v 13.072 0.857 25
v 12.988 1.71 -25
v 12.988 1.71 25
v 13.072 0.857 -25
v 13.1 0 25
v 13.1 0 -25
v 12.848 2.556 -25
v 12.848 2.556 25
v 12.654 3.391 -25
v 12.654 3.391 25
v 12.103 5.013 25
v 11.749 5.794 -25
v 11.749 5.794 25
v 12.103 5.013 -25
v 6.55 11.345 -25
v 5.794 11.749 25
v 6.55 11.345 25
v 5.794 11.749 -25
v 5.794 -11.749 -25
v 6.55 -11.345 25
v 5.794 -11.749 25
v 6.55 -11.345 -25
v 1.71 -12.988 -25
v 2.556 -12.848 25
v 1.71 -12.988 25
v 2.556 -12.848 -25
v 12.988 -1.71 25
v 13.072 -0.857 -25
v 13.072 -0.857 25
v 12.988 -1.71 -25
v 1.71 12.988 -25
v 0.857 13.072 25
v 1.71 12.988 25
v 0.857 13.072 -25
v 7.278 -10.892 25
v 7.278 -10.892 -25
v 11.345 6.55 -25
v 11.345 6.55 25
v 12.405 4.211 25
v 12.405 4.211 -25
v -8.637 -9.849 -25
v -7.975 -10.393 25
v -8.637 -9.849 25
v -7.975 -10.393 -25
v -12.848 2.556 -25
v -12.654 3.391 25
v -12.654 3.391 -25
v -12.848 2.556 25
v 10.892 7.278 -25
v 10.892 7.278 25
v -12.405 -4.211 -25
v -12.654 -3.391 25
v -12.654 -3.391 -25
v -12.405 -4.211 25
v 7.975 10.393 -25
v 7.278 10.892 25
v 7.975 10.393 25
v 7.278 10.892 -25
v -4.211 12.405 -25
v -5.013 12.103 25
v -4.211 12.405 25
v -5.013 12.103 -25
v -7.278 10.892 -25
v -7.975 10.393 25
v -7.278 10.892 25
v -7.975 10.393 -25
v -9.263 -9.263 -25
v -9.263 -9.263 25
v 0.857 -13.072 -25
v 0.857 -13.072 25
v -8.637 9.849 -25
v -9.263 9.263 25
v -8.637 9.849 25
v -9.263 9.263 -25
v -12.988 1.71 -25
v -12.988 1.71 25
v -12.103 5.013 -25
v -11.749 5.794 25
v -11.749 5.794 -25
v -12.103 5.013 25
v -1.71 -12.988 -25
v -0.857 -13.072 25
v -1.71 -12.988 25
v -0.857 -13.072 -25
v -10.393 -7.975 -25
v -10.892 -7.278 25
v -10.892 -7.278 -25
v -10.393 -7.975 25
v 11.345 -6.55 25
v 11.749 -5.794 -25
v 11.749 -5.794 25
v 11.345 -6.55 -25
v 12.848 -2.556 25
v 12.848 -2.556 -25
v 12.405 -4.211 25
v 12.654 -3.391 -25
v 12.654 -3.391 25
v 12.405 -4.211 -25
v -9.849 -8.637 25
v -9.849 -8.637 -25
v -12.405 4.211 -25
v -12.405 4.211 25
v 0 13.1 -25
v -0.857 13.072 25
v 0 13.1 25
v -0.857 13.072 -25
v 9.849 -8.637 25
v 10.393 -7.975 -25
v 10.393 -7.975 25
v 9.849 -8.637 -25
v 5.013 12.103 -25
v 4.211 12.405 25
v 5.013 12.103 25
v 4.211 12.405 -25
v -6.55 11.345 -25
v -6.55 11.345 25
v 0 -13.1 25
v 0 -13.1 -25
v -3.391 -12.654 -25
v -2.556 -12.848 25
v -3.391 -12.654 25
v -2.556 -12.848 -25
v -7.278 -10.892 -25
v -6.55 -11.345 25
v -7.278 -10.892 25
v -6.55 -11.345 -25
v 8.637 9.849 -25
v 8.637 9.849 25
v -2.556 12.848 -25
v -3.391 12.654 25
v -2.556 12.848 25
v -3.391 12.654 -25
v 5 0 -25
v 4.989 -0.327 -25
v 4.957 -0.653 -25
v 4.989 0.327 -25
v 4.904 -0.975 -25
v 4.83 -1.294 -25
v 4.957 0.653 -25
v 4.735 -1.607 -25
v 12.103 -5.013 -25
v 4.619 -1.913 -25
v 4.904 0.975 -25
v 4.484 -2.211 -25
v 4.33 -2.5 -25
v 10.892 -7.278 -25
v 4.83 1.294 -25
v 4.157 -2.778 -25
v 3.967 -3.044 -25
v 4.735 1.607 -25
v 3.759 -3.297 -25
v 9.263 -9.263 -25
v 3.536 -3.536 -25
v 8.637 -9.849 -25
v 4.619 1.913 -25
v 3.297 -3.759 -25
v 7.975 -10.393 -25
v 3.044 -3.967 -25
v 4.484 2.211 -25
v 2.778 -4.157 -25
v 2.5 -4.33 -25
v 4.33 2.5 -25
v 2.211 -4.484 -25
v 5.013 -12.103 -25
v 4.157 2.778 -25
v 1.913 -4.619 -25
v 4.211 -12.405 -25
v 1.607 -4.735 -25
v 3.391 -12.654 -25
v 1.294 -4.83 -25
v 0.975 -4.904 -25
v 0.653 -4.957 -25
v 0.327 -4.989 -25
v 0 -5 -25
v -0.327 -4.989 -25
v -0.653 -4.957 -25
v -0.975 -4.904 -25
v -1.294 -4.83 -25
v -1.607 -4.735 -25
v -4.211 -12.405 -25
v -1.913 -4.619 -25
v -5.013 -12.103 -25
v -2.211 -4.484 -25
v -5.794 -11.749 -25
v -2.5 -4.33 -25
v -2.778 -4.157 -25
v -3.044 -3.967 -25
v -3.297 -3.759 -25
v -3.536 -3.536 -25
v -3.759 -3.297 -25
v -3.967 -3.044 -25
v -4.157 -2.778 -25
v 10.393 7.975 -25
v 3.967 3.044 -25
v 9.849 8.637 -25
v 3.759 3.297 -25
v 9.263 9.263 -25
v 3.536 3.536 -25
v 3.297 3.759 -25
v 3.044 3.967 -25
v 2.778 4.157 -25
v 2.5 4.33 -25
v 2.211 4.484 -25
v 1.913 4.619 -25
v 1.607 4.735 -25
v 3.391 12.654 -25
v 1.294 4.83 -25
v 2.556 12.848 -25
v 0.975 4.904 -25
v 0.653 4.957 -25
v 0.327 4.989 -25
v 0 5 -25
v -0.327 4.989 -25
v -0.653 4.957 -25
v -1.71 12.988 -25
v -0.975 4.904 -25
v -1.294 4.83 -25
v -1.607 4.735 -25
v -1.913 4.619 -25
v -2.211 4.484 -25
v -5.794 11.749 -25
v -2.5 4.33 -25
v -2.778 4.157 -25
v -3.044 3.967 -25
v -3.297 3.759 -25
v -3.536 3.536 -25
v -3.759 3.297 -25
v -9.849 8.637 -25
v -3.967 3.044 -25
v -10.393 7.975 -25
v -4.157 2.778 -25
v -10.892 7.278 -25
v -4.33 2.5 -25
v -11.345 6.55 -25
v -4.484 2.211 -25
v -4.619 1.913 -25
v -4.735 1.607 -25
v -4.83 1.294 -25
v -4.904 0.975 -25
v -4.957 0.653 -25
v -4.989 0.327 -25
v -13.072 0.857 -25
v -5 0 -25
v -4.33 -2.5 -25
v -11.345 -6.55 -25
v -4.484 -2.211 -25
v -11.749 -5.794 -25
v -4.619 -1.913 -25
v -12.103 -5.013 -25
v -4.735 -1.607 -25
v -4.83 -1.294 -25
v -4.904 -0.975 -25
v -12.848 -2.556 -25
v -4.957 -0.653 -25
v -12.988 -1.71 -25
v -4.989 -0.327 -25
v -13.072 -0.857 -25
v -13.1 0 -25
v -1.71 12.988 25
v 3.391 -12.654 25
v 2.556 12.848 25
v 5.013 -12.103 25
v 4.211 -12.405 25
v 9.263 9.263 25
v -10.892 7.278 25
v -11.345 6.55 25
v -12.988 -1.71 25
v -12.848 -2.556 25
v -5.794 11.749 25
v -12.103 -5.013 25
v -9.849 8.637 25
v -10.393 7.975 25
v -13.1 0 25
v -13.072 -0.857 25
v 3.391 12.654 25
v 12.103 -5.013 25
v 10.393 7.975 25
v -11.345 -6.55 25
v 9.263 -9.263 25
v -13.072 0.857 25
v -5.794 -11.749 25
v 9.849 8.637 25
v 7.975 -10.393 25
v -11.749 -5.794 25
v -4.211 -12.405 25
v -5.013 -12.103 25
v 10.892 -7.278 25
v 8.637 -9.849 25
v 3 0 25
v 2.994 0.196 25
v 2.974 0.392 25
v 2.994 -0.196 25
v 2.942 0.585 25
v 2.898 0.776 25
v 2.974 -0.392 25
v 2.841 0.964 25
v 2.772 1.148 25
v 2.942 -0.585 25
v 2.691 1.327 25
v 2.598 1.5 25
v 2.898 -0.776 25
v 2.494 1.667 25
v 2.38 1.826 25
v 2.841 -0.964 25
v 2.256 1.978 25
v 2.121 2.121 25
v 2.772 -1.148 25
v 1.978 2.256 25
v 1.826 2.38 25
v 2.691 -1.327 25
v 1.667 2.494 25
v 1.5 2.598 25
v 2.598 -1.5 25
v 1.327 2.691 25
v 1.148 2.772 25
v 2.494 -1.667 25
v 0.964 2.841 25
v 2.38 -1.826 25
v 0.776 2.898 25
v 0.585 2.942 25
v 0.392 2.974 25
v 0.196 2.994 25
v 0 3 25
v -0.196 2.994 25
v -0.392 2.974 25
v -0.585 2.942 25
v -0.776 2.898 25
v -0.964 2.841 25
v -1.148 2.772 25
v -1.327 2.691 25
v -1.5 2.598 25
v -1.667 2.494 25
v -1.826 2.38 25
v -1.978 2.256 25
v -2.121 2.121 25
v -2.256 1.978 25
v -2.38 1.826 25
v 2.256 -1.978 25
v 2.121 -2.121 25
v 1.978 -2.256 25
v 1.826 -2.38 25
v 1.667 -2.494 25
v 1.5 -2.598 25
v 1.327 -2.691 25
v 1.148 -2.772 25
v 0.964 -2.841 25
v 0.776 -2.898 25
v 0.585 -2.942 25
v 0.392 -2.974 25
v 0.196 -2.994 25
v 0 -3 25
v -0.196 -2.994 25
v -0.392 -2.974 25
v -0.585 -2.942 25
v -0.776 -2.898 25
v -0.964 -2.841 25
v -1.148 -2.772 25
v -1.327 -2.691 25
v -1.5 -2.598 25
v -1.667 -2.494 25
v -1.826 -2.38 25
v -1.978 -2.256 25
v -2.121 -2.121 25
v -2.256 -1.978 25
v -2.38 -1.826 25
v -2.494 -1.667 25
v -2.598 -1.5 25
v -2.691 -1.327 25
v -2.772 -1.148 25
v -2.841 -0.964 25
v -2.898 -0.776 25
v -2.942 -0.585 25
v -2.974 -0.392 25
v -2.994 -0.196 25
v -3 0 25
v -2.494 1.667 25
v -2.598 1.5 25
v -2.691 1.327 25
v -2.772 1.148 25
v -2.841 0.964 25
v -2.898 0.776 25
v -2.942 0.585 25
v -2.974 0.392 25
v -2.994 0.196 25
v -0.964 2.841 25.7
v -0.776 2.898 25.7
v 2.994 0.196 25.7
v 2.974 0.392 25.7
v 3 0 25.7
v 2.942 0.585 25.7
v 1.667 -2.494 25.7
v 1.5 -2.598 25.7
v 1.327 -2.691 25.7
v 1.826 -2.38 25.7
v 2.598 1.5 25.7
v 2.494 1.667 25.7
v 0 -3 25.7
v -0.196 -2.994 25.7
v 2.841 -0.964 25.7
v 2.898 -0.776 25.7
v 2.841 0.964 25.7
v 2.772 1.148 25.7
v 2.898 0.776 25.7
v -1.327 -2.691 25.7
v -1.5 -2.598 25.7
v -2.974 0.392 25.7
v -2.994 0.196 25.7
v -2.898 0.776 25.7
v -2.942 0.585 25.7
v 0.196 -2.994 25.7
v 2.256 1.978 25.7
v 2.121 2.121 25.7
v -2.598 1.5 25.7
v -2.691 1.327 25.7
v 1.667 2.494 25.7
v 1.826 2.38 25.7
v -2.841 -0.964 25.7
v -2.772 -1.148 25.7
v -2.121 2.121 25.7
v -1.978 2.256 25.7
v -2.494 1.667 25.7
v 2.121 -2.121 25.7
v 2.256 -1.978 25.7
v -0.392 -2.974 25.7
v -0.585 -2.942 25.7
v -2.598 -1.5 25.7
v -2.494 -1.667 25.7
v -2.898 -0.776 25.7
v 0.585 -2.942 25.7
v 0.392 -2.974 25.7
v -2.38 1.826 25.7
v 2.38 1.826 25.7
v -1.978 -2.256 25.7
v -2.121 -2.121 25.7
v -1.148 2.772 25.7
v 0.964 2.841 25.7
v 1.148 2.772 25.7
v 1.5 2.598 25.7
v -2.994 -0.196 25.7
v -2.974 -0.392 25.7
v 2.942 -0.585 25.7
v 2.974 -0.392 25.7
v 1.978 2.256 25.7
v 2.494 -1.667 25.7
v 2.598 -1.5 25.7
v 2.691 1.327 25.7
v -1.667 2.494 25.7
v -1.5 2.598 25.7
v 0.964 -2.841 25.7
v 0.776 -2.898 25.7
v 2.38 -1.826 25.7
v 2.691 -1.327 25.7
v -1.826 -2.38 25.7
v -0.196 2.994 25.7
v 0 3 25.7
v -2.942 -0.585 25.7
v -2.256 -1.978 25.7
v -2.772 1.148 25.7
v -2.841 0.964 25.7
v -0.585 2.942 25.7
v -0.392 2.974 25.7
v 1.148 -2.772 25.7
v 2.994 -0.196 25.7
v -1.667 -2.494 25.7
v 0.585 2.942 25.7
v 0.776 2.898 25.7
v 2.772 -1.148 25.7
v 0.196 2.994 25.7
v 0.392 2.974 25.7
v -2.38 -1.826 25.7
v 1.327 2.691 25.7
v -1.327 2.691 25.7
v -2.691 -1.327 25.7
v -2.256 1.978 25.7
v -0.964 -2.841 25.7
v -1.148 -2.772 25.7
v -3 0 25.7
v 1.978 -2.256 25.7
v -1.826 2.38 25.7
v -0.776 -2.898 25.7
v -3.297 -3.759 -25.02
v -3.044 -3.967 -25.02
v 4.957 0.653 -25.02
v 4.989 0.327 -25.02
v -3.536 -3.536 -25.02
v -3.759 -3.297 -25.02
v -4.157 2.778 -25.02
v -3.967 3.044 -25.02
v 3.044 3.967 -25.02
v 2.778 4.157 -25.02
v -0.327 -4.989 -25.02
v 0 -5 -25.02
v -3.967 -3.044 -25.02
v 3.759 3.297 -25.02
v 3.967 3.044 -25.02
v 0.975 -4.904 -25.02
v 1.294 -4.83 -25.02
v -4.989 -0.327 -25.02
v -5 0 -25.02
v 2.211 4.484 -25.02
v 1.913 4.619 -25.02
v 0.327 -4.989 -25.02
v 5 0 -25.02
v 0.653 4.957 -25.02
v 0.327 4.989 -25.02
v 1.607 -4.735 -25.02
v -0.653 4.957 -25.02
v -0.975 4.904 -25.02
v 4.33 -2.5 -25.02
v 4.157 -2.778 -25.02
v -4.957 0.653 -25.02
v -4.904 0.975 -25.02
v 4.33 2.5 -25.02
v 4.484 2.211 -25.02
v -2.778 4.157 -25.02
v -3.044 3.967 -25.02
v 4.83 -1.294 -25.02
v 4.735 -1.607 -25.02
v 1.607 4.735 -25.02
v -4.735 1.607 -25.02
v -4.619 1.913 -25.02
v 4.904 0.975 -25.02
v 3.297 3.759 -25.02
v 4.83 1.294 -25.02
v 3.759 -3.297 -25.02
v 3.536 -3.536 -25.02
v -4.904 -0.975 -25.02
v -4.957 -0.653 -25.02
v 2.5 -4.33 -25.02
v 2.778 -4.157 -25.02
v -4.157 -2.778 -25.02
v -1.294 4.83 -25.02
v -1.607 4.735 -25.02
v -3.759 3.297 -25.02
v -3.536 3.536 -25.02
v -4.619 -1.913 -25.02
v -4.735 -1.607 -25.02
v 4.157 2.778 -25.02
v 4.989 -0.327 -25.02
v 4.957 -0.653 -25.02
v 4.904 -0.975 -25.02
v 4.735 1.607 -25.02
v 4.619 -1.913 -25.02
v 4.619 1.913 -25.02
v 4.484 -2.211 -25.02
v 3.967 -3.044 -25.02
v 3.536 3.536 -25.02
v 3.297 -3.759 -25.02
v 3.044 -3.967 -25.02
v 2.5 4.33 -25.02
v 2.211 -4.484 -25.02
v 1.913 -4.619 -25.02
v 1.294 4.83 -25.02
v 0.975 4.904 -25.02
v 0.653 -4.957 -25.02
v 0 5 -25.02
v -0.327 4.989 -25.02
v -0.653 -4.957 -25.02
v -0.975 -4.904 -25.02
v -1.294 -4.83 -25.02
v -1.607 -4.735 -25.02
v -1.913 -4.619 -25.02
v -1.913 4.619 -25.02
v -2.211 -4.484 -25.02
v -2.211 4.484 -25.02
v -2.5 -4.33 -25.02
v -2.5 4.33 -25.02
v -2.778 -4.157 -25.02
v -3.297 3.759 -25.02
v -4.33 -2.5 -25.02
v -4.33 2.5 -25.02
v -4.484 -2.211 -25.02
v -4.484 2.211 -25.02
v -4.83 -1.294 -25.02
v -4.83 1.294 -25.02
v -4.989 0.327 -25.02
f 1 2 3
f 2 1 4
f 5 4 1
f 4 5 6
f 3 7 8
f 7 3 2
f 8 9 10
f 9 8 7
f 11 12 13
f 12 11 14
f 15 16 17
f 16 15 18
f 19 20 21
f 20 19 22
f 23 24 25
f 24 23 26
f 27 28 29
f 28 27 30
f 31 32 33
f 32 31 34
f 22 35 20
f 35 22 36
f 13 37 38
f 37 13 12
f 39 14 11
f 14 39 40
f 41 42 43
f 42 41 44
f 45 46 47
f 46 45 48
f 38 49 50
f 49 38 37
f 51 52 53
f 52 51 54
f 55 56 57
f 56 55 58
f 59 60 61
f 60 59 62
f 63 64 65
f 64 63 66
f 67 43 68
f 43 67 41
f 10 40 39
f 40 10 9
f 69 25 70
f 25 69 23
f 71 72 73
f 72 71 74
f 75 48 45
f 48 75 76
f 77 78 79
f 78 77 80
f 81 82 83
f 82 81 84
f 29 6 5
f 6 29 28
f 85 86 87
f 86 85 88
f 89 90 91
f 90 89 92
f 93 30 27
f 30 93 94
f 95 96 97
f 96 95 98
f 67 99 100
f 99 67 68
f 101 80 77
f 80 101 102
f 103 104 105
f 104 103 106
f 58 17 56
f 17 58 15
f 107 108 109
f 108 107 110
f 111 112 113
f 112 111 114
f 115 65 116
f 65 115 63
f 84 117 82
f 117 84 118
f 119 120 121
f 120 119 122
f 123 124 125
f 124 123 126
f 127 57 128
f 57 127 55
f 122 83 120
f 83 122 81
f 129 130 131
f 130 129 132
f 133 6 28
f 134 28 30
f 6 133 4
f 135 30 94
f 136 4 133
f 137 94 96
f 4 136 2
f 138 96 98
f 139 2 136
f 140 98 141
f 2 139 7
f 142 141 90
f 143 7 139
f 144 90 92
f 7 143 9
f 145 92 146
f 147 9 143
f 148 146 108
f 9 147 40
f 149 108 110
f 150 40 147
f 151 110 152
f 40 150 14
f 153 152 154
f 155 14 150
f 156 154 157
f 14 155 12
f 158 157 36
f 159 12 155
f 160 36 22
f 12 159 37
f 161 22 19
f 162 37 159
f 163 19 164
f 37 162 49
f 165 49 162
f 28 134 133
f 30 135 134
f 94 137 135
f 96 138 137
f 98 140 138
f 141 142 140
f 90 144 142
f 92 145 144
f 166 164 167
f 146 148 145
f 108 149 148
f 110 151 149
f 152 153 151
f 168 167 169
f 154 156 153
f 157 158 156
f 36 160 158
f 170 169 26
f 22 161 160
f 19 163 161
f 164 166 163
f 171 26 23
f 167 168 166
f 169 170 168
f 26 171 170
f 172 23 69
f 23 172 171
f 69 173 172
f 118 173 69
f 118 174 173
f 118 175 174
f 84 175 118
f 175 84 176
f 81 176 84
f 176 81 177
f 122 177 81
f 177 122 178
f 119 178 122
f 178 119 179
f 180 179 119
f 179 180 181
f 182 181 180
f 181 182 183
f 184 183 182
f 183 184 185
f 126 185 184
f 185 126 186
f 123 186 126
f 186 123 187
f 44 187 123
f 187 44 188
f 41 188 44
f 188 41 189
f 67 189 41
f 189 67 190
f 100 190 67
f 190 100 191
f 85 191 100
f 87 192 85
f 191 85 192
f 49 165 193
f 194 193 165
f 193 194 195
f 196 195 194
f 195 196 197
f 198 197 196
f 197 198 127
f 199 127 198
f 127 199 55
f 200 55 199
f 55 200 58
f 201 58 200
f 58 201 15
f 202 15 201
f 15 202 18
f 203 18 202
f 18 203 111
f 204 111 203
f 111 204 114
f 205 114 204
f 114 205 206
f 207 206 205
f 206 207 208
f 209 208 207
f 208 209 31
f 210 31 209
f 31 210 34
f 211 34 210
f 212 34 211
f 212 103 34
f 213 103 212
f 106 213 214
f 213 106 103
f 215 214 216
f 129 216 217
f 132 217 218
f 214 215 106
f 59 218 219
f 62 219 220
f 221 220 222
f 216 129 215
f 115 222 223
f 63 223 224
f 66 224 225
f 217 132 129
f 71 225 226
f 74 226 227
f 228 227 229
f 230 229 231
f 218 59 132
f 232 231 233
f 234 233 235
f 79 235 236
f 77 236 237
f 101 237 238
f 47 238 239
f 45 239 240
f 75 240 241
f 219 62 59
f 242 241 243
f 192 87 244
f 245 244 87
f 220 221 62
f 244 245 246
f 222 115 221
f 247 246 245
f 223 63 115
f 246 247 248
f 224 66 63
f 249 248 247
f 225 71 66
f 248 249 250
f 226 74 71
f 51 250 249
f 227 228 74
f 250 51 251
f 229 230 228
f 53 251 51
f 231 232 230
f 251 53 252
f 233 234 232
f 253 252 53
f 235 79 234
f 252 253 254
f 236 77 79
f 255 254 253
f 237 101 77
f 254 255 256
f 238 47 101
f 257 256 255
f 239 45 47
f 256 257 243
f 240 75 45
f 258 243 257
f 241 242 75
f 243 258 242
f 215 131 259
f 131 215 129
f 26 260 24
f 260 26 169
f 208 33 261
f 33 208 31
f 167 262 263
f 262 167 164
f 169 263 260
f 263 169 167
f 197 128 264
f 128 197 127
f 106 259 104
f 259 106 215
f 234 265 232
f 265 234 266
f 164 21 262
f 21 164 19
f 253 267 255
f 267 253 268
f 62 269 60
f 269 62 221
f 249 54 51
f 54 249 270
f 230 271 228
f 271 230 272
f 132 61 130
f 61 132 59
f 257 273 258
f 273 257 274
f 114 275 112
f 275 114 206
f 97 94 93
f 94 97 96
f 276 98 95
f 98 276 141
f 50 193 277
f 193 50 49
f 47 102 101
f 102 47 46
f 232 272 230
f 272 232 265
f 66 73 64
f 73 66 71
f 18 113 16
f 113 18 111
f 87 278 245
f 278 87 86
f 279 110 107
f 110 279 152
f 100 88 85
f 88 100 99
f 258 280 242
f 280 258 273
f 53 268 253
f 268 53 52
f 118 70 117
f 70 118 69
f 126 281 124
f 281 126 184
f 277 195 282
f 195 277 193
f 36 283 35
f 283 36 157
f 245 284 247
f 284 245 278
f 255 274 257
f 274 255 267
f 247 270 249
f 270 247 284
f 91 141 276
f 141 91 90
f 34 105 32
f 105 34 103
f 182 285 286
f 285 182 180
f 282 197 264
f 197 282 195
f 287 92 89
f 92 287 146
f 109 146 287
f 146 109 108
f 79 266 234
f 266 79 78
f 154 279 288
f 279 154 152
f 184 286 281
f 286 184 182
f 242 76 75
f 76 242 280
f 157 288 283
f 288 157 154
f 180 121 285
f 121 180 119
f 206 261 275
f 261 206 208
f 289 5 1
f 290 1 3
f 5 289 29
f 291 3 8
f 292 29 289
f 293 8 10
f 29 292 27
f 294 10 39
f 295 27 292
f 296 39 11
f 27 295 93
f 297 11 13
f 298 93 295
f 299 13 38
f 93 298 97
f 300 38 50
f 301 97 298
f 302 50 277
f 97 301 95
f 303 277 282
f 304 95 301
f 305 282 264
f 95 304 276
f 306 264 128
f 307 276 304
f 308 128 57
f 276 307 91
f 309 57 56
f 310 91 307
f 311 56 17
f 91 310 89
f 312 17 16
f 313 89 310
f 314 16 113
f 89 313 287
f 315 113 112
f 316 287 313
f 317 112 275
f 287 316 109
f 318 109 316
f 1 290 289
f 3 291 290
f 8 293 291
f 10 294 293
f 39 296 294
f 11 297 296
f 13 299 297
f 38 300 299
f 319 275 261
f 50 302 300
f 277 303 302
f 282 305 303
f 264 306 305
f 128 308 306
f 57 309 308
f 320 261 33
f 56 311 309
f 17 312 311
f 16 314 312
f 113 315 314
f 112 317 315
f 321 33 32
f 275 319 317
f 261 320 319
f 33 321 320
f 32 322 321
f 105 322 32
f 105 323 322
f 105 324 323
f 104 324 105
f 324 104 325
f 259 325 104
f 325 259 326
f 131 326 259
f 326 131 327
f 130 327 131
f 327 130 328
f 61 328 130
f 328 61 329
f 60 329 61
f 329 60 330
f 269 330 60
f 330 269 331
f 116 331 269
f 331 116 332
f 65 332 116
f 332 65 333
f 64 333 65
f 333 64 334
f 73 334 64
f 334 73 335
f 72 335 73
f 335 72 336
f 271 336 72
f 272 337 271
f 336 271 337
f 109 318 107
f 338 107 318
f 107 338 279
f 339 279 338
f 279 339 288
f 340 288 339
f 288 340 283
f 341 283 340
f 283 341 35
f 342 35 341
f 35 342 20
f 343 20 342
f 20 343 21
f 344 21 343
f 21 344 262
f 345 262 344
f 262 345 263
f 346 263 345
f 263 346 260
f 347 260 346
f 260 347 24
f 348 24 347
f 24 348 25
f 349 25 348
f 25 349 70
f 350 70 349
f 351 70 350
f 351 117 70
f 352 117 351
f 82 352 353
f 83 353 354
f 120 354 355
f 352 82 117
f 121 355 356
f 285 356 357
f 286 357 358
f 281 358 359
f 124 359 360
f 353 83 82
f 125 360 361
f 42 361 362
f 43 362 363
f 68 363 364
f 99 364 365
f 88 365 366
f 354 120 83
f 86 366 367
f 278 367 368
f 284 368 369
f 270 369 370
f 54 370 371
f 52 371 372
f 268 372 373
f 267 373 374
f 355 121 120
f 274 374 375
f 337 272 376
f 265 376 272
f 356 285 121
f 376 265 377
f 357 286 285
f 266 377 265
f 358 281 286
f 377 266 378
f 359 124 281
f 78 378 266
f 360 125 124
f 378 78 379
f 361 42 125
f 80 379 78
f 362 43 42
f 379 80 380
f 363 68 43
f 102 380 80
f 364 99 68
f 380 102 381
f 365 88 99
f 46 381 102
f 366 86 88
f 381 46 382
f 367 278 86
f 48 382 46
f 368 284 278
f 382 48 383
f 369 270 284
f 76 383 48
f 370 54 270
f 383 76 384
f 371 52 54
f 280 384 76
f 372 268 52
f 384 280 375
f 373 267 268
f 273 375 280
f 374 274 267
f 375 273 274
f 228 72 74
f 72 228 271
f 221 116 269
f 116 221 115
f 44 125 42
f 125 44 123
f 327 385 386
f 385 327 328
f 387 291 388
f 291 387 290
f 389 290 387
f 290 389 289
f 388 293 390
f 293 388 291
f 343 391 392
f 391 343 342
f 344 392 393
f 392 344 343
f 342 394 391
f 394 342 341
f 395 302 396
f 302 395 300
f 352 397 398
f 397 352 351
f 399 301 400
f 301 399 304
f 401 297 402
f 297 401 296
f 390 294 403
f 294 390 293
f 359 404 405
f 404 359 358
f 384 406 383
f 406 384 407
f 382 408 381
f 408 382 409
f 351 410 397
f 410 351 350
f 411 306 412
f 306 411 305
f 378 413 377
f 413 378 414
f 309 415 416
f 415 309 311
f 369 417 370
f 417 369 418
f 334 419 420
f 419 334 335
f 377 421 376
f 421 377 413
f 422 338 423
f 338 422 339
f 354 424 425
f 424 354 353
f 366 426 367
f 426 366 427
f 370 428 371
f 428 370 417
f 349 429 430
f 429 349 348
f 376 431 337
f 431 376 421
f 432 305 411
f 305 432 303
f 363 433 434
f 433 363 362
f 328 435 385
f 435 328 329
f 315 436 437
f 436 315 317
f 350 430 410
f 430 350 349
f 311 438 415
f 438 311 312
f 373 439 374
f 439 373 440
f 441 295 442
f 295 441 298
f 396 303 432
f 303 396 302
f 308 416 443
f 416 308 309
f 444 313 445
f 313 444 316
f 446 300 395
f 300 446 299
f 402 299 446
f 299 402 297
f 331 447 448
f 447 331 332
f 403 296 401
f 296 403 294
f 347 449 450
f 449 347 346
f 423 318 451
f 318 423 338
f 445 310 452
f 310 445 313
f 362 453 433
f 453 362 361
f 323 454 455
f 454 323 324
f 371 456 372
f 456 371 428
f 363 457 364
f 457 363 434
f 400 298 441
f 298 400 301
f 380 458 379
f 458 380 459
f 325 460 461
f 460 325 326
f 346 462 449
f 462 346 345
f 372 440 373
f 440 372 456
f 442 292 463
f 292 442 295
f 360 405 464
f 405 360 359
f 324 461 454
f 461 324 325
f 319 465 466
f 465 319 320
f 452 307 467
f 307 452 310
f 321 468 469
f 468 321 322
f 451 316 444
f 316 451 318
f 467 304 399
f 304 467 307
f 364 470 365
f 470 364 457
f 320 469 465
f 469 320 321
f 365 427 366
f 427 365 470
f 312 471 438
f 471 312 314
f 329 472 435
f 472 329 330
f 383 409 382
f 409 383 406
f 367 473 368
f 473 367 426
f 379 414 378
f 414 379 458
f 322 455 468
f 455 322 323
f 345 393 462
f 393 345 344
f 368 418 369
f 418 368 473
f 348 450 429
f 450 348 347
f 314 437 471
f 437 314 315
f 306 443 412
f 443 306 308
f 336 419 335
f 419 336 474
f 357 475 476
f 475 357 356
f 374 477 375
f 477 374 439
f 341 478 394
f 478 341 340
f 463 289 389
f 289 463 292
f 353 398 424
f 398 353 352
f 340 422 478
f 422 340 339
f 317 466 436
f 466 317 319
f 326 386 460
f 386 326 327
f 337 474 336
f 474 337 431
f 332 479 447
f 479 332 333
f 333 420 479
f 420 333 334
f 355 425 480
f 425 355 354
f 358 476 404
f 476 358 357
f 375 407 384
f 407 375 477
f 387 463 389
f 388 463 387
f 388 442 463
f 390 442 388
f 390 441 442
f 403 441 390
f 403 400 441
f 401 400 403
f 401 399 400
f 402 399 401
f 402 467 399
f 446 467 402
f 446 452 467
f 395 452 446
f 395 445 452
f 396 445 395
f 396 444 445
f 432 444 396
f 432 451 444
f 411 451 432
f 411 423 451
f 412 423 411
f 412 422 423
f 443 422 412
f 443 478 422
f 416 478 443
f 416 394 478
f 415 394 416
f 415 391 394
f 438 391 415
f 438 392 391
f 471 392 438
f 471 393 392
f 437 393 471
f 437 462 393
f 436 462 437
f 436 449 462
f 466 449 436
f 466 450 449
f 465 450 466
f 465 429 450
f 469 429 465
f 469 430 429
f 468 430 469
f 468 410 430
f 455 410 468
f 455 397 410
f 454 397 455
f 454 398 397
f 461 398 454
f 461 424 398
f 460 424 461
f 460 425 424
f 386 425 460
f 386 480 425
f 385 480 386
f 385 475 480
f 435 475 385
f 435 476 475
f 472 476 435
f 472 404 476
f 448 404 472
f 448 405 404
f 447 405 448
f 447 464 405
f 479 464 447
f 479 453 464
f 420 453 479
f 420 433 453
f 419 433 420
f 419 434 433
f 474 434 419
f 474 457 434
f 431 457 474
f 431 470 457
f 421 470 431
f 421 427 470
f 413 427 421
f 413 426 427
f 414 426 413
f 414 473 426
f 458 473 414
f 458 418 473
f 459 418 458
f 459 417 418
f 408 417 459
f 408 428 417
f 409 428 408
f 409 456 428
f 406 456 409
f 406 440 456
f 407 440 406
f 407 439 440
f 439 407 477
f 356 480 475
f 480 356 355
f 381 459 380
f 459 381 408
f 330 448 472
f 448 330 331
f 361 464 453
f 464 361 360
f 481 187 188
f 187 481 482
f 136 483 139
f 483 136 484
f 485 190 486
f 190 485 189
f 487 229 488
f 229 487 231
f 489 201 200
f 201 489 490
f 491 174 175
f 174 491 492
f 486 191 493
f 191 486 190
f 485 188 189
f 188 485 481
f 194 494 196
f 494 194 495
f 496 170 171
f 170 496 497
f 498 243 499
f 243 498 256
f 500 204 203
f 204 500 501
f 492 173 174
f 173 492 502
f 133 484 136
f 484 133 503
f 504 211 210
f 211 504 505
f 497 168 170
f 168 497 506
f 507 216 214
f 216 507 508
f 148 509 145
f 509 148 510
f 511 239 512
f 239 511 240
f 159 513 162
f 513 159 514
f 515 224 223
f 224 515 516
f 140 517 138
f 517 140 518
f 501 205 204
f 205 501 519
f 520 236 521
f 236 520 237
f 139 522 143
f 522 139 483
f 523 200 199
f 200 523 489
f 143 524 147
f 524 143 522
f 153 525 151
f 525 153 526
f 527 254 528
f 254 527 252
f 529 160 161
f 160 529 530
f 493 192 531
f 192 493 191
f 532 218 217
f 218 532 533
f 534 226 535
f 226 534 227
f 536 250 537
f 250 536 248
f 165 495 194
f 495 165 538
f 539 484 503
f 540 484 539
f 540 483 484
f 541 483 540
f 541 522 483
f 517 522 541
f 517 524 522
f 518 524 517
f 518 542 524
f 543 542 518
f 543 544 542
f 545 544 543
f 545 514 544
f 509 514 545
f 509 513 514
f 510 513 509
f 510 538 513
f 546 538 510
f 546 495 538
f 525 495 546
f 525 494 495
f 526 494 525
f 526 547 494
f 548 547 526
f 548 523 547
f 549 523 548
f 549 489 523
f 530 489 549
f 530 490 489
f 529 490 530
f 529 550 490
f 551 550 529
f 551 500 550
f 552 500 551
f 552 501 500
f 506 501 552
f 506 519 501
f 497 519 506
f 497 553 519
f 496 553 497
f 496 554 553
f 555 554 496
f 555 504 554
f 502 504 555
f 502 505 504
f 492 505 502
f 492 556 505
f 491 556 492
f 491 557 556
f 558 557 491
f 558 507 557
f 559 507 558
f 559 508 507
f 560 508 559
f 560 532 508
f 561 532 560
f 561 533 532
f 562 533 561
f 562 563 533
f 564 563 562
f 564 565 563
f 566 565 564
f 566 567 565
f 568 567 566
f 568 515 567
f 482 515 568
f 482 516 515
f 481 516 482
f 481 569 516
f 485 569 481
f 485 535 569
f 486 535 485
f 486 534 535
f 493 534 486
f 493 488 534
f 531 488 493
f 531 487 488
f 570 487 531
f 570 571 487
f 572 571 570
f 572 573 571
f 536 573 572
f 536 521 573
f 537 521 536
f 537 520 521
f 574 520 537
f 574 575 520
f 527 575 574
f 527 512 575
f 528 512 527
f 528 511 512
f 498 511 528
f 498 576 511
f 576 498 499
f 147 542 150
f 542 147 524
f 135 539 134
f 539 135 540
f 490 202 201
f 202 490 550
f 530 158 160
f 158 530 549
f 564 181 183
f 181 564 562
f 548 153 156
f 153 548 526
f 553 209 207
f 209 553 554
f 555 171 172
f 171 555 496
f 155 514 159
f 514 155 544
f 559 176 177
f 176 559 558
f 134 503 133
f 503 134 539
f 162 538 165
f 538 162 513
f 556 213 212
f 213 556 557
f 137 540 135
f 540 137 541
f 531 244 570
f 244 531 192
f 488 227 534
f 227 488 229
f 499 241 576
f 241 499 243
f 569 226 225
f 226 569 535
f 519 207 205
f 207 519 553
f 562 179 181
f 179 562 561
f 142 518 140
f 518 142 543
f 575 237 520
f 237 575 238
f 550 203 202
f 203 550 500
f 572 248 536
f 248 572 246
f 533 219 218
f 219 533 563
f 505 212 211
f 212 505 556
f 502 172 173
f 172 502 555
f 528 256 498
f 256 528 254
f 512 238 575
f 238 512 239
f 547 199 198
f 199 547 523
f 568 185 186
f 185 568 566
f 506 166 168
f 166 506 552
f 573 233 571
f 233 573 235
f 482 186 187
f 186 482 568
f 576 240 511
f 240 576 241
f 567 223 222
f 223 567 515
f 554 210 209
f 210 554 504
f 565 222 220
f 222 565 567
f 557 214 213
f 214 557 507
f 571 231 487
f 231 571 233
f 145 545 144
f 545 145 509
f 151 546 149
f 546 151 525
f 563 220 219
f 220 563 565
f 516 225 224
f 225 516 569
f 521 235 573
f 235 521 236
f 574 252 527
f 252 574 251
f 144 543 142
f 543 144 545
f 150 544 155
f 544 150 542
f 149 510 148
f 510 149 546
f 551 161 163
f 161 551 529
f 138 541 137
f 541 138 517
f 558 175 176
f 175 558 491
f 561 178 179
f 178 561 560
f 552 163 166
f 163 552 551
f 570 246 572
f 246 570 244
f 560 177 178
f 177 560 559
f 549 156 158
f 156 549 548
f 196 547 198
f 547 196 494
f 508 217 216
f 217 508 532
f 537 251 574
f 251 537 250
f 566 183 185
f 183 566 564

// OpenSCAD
// Parameters
height_mm = 50.0; //[25.0:100.0:0.1]
diameter_mm = 26.2; //[13.1:52.4:0.1]
positive_terminal_diameter_mm = 6.0; //[3.0:12.0:0.1]
positive_terminal_height_mm = 1.5; //[0.75:3.0:0.05]
negative_terminal_diameter_mm = 10.0; //[5.0:20.0:0.1]
negative_terminal_height_mm = 0.2; //[0.1:0.6:0.05]
terminal_overlap_mm = 0.8; //[0.5:2.0:0.1]

$fn = 96;

// Battery - one connected solid, oriented along Z (height)
module battery() {
  body_h = height_mm;
  body_r = diameter_mm/2;

  pos_h = positive_terminal_height_mm;
  pos_r = positive_terminal_diameter_mm/2;

  neg_h = negative_terminal_height_mm;
  neg_r = negative_terminal_diameter_mm/2;

  overlap = terminal_overlap_mm;

  // Keep overlap smaller than each terminal height to avoid inversion
  overlap_pos = min(overlap, pos_h*0.9);
  overlap_neg = min(overlap, neg_h*0.9);

  union() {
    // Main cylindrical body (50mm tall, 26.2mm diameter)
    cylinder(h=body_h, r=body_r, center=true);

    // Positive terminal (top), overlapped into body to ensure connectivity
    translate([0, 0, body_h/2 + pos_h/2 - overlap_pos])
      cylinder(h=pos_h, r=pos_r, center=true);

    // Negative terminal (bottom), overlapped into body to ensure connectivity
    translate([0, 0, -body_h/2 - neg_h/2 + overlap_neg])
      cylinder(h=neg_h, r=neg_r, center=true);
  }
}

battery();
